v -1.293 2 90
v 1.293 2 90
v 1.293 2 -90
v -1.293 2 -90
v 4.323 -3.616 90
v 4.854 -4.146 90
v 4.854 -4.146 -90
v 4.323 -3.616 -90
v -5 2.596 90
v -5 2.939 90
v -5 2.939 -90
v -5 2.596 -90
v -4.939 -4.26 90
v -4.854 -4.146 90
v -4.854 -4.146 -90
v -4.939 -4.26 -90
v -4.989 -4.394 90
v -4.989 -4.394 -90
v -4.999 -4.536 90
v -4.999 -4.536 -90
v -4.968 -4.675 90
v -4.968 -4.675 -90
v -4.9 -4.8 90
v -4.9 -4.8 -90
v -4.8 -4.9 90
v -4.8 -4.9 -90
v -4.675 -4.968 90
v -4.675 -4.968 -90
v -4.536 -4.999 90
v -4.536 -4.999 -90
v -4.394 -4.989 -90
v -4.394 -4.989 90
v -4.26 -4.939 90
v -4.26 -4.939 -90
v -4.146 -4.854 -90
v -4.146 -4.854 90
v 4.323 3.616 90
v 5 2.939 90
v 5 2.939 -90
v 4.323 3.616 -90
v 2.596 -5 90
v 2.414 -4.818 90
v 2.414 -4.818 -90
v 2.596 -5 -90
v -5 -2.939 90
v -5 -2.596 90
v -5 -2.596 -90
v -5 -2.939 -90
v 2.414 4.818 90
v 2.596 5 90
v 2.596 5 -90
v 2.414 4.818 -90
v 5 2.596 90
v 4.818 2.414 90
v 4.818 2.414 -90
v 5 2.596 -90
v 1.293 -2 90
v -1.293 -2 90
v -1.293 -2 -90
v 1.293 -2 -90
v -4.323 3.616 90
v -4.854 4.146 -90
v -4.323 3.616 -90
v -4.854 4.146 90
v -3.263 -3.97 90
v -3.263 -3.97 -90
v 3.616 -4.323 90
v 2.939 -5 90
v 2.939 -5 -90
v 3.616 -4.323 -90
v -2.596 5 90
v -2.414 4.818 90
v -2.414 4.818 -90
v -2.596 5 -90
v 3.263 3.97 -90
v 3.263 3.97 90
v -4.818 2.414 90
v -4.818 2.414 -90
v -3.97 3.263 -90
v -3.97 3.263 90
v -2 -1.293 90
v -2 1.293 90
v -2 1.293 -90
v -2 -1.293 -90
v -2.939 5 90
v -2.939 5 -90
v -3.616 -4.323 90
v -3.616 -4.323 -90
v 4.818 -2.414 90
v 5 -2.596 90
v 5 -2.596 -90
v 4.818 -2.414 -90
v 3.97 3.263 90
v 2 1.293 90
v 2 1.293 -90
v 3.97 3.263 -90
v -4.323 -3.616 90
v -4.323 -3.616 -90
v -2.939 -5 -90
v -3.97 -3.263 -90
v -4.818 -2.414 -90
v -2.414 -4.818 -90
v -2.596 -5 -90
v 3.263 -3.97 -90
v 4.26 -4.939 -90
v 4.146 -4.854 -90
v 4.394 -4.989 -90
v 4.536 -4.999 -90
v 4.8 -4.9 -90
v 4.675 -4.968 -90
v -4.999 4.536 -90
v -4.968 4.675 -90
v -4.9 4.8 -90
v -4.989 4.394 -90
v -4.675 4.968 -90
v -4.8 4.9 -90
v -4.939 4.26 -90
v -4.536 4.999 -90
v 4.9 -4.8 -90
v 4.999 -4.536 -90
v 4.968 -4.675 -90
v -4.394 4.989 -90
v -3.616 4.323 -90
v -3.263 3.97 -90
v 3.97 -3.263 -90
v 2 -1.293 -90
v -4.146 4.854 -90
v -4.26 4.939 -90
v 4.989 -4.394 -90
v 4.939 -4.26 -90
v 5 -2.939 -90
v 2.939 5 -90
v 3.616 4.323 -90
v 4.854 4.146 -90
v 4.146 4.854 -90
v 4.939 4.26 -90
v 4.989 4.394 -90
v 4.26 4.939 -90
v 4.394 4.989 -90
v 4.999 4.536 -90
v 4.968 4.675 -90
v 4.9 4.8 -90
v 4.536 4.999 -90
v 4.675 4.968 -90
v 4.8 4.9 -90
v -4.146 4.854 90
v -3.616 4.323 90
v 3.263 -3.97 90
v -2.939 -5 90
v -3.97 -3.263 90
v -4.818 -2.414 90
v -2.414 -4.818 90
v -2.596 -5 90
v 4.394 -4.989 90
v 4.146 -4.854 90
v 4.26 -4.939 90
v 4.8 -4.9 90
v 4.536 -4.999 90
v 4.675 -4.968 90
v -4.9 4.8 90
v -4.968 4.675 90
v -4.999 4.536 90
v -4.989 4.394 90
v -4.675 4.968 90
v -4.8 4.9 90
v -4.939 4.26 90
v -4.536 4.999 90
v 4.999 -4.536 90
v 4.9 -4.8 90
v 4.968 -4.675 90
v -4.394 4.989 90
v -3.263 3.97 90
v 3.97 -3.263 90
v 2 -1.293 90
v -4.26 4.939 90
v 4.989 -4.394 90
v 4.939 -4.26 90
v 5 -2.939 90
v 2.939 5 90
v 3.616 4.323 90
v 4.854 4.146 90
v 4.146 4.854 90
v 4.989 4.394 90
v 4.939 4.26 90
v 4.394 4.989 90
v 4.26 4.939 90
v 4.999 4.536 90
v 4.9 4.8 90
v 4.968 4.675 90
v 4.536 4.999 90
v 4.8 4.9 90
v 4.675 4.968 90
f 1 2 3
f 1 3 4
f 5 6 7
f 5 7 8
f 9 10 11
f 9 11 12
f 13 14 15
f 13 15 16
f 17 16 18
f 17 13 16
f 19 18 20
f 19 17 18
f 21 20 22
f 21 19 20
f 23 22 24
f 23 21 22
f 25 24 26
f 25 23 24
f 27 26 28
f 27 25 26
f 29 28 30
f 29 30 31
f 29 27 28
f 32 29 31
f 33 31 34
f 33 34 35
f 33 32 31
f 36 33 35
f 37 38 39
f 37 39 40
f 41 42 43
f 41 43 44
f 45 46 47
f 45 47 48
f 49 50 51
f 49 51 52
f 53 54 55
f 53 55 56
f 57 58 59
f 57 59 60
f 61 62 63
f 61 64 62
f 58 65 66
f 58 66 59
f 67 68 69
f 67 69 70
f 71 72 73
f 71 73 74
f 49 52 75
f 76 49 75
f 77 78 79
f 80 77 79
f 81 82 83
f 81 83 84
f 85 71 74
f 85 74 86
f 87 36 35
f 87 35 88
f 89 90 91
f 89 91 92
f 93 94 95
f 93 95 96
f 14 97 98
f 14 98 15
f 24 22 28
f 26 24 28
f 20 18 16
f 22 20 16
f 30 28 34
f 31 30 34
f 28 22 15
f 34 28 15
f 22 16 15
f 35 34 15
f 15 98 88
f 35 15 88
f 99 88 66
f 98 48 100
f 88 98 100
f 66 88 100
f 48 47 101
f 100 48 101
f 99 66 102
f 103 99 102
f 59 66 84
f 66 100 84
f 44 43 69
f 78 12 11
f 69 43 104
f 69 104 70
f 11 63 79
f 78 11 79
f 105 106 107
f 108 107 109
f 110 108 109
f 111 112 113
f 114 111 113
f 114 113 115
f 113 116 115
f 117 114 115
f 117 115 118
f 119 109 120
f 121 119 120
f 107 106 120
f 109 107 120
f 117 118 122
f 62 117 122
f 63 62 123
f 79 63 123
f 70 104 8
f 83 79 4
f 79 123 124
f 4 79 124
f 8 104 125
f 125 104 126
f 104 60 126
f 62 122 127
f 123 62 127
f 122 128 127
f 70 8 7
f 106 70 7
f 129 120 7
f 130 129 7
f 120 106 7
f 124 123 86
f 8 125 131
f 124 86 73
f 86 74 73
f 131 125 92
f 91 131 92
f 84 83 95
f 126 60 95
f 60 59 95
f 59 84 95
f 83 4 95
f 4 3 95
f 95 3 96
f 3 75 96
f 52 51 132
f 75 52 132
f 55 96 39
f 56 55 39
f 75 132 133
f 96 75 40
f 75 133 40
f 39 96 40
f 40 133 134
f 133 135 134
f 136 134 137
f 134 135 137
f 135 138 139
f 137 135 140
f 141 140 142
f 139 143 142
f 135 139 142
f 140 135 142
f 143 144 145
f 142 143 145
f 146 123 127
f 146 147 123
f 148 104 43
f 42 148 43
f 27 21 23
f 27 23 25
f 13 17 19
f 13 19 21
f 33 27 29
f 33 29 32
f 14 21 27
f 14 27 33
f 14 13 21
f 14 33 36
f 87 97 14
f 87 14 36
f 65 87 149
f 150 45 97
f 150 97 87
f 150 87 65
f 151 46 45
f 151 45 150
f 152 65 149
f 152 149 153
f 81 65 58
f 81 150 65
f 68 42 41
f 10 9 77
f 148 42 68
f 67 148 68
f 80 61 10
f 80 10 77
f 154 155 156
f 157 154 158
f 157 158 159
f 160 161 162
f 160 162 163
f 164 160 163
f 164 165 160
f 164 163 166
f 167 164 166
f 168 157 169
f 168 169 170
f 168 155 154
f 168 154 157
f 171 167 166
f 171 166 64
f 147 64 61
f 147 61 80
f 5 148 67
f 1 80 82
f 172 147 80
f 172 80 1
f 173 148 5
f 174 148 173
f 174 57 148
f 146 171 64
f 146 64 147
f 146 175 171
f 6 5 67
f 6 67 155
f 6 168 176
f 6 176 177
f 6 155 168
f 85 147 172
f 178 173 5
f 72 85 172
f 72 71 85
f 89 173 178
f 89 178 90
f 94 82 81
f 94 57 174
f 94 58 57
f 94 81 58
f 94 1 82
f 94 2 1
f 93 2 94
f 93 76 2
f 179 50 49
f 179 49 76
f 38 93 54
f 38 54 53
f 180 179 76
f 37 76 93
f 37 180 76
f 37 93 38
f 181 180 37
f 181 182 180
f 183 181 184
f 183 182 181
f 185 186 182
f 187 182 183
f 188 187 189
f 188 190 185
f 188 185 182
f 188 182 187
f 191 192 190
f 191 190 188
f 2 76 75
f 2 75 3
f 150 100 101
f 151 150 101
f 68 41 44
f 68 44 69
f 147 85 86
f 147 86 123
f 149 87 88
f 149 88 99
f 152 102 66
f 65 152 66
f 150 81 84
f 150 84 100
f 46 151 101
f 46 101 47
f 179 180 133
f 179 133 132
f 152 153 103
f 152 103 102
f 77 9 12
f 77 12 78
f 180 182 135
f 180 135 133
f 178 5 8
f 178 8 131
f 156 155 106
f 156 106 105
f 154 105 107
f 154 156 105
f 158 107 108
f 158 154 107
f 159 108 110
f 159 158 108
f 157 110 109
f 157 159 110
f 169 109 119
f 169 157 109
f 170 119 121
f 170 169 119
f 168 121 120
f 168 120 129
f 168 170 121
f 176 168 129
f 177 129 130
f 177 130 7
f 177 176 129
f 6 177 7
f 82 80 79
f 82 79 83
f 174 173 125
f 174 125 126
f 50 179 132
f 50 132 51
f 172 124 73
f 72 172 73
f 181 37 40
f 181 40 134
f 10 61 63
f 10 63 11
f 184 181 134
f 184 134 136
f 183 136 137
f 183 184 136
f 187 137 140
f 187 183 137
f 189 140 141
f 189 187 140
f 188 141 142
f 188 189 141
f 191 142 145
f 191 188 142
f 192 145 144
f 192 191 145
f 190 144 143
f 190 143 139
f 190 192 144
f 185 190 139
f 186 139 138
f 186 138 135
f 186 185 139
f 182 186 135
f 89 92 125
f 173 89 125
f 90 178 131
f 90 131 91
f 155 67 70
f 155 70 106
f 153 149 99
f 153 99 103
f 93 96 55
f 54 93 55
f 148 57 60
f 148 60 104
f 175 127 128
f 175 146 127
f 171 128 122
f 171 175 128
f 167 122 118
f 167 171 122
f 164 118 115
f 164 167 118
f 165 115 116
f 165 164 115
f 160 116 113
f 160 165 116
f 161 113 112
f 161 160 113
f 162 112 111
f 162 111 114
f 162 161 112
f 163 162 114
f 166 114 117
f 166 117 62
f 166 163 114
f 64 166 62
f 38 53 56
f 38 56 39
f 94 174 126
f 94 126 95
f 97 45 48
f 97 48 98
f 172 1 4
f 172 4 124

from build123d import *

# Parameters (mm, degrees)
BOSS_EXTRUDE1_DEPTH = 90


with BuildPart() as part:
    # Sketch2 → Boss-Extrude1 (new, symmetric)
    with BuildSketch(Plane.XY):
        with BuildLine():
            Line((-4.853553391, 4.146446609), (-4.323223305, 3.616116524))
            Line((-4.323223305, 3.616116524), (-5, 2.939339828))
            Line((-5, 2.939339828), (-5, 2.595836944))
            Line((-5, 2.595836944), (-4.818198052, 2.414034995))
            Line((-4.818198052, 2.414034995), (-3.969669914, 3.262563133))
            Line((-3.969669914, 3.262563133), (-2, 1.292893219))
            Line((-2, 1.292893219), (-2, -1.292893219))
            Line((-2, -1.292893219), (-3.969669914, -3.262563133))
            Line((-3.969669914, -3.262563133), (-4.818198052, -2.414034995))
            Line((-4.818198052, -2.414034995), (-5, -2.595836944))
            Line((-5, -2.595836944), (-5, -2.939339828))
            Line((-5, -2.939339828), (-4.323223305, -3.616116524))
            Line((-4.323223305, -3.616116524), (-4.853553391, -4.146446609))
            ThreePointArc((-4.853553391, -4.146446609), (-4.853553391, -4.853553391), (-4.146446609, -4.853553391))
            Line((-4.146446609, -4.853553391), (-3.616116524, -4.323223305))
            Line((-3.616116524, -4.323223305), (-2.939339828, -5))
            Line((-2.939339828, -5), (-2.595836944, -5))
            Line((-2.595836944, -5), (-2.414034995, -4.818198052))
            Line((-2.414034995, -4.818198052), (-3.262563133, -3.969669914))
            Line((-3.262563133, -3.969669914), (-1.292893219, -2))
            Line((-1.292893219, -2), (1.292893219, -2))
            Line((1.292893219, -2), (3.262563133, -3.969669914))
            Line((3.262563133, -3.969669914), (2.414034995, -4.818198052))
            Line((2.414034995, -4.818198052), (2.595836944, -5))
            Line((2.595836944, -5), (2.939339828, -5))
            Line((2.939339828, -5), (3.616116524, -4.323223305))
            Line((3.616116524, -4.323223305), (4.146446609, -4.853553391))
            ThreePointArc((4.146446609, -4.853553391), (4.853553391, -4.853553391), (4.853553391, -4.146446609))
            Line((4.853553391, -4.146446609), (4.323223305, -3.616116524))
            Line((4.323223305, -3.616116524), (5, -2.939339828))
            Line((5, -2.939339828), (5, -2.595836944))
            Line((5, -2.595836944), (4.818198052, -2.414034995))
            Line((4.818198052, -2.414034995), (3.969669914, -3.262563133))
            Line((3.969669914, -3.262563133), (2, -1.292893219))
            Line((2, -1.292893219), (2, 1.292893219))
            Line((2, 1.292893219), (3.969669914, 3.262563133))
            Line((3.969669914, 3.262563133), (4.818198052, 2.414034995))
            Line((4.818198052, 2.414034995), (5, 2.595836944))
            Line((5, 2.595836944), (5, 2.939339828))
            Line((5, 2.939339828), (4.323223305, 3.616116524))
            Line((4.323223305, 3.616116524), (4.853553391, 4.146446609))
            ThreePointArc((4.853553391, 4.146446609), (4.853553391, 4.853553391), (4.146446609, 4.853553391))
            Line((4.146446609, 4.853553391), (3.616116524, 4.323223305))
            Line((3.616116524, 4.323223305), (2.939339828, 5))
            Line((2.939339828, 5), (2.595836944, 5))
            Line((2.595836944, 5), (2.414034995, 4.818198052))
            Line((2.414034995, 4.818198052), (3.262563133, 3.969669914))
            Line((3.262563133, 3.969669914), (1.292893219, 2))
            Line((1.292893219, 2), (-1.292893219, 2))
            Line((-1.292893219, 2), (-3.262563133, 3.969669914))
            Line((-3.262563133, 3.969669914), (-2.414034995, 4.818198052))
            Line((-2.414034995, 4.818198052), (-2.595836944, 5))
            Line((-2.595836944, 5), (-2.939339828, 5))
            Line((-2.939339828, 5), (-3.616116524, 4.323223305))
            Line((-3.616116524, 4.323223305), (-4.146446609, 4.853553391))
            ThreePointArc((-4.146446609, 4.853553391), (-4.853553391, 4.853553391), (-4.853553391, 4.146446609))
        make_face()
    extrude(amount=BOSS_EXTRUDE1_DEPTH, both=True)


solid = part.part
